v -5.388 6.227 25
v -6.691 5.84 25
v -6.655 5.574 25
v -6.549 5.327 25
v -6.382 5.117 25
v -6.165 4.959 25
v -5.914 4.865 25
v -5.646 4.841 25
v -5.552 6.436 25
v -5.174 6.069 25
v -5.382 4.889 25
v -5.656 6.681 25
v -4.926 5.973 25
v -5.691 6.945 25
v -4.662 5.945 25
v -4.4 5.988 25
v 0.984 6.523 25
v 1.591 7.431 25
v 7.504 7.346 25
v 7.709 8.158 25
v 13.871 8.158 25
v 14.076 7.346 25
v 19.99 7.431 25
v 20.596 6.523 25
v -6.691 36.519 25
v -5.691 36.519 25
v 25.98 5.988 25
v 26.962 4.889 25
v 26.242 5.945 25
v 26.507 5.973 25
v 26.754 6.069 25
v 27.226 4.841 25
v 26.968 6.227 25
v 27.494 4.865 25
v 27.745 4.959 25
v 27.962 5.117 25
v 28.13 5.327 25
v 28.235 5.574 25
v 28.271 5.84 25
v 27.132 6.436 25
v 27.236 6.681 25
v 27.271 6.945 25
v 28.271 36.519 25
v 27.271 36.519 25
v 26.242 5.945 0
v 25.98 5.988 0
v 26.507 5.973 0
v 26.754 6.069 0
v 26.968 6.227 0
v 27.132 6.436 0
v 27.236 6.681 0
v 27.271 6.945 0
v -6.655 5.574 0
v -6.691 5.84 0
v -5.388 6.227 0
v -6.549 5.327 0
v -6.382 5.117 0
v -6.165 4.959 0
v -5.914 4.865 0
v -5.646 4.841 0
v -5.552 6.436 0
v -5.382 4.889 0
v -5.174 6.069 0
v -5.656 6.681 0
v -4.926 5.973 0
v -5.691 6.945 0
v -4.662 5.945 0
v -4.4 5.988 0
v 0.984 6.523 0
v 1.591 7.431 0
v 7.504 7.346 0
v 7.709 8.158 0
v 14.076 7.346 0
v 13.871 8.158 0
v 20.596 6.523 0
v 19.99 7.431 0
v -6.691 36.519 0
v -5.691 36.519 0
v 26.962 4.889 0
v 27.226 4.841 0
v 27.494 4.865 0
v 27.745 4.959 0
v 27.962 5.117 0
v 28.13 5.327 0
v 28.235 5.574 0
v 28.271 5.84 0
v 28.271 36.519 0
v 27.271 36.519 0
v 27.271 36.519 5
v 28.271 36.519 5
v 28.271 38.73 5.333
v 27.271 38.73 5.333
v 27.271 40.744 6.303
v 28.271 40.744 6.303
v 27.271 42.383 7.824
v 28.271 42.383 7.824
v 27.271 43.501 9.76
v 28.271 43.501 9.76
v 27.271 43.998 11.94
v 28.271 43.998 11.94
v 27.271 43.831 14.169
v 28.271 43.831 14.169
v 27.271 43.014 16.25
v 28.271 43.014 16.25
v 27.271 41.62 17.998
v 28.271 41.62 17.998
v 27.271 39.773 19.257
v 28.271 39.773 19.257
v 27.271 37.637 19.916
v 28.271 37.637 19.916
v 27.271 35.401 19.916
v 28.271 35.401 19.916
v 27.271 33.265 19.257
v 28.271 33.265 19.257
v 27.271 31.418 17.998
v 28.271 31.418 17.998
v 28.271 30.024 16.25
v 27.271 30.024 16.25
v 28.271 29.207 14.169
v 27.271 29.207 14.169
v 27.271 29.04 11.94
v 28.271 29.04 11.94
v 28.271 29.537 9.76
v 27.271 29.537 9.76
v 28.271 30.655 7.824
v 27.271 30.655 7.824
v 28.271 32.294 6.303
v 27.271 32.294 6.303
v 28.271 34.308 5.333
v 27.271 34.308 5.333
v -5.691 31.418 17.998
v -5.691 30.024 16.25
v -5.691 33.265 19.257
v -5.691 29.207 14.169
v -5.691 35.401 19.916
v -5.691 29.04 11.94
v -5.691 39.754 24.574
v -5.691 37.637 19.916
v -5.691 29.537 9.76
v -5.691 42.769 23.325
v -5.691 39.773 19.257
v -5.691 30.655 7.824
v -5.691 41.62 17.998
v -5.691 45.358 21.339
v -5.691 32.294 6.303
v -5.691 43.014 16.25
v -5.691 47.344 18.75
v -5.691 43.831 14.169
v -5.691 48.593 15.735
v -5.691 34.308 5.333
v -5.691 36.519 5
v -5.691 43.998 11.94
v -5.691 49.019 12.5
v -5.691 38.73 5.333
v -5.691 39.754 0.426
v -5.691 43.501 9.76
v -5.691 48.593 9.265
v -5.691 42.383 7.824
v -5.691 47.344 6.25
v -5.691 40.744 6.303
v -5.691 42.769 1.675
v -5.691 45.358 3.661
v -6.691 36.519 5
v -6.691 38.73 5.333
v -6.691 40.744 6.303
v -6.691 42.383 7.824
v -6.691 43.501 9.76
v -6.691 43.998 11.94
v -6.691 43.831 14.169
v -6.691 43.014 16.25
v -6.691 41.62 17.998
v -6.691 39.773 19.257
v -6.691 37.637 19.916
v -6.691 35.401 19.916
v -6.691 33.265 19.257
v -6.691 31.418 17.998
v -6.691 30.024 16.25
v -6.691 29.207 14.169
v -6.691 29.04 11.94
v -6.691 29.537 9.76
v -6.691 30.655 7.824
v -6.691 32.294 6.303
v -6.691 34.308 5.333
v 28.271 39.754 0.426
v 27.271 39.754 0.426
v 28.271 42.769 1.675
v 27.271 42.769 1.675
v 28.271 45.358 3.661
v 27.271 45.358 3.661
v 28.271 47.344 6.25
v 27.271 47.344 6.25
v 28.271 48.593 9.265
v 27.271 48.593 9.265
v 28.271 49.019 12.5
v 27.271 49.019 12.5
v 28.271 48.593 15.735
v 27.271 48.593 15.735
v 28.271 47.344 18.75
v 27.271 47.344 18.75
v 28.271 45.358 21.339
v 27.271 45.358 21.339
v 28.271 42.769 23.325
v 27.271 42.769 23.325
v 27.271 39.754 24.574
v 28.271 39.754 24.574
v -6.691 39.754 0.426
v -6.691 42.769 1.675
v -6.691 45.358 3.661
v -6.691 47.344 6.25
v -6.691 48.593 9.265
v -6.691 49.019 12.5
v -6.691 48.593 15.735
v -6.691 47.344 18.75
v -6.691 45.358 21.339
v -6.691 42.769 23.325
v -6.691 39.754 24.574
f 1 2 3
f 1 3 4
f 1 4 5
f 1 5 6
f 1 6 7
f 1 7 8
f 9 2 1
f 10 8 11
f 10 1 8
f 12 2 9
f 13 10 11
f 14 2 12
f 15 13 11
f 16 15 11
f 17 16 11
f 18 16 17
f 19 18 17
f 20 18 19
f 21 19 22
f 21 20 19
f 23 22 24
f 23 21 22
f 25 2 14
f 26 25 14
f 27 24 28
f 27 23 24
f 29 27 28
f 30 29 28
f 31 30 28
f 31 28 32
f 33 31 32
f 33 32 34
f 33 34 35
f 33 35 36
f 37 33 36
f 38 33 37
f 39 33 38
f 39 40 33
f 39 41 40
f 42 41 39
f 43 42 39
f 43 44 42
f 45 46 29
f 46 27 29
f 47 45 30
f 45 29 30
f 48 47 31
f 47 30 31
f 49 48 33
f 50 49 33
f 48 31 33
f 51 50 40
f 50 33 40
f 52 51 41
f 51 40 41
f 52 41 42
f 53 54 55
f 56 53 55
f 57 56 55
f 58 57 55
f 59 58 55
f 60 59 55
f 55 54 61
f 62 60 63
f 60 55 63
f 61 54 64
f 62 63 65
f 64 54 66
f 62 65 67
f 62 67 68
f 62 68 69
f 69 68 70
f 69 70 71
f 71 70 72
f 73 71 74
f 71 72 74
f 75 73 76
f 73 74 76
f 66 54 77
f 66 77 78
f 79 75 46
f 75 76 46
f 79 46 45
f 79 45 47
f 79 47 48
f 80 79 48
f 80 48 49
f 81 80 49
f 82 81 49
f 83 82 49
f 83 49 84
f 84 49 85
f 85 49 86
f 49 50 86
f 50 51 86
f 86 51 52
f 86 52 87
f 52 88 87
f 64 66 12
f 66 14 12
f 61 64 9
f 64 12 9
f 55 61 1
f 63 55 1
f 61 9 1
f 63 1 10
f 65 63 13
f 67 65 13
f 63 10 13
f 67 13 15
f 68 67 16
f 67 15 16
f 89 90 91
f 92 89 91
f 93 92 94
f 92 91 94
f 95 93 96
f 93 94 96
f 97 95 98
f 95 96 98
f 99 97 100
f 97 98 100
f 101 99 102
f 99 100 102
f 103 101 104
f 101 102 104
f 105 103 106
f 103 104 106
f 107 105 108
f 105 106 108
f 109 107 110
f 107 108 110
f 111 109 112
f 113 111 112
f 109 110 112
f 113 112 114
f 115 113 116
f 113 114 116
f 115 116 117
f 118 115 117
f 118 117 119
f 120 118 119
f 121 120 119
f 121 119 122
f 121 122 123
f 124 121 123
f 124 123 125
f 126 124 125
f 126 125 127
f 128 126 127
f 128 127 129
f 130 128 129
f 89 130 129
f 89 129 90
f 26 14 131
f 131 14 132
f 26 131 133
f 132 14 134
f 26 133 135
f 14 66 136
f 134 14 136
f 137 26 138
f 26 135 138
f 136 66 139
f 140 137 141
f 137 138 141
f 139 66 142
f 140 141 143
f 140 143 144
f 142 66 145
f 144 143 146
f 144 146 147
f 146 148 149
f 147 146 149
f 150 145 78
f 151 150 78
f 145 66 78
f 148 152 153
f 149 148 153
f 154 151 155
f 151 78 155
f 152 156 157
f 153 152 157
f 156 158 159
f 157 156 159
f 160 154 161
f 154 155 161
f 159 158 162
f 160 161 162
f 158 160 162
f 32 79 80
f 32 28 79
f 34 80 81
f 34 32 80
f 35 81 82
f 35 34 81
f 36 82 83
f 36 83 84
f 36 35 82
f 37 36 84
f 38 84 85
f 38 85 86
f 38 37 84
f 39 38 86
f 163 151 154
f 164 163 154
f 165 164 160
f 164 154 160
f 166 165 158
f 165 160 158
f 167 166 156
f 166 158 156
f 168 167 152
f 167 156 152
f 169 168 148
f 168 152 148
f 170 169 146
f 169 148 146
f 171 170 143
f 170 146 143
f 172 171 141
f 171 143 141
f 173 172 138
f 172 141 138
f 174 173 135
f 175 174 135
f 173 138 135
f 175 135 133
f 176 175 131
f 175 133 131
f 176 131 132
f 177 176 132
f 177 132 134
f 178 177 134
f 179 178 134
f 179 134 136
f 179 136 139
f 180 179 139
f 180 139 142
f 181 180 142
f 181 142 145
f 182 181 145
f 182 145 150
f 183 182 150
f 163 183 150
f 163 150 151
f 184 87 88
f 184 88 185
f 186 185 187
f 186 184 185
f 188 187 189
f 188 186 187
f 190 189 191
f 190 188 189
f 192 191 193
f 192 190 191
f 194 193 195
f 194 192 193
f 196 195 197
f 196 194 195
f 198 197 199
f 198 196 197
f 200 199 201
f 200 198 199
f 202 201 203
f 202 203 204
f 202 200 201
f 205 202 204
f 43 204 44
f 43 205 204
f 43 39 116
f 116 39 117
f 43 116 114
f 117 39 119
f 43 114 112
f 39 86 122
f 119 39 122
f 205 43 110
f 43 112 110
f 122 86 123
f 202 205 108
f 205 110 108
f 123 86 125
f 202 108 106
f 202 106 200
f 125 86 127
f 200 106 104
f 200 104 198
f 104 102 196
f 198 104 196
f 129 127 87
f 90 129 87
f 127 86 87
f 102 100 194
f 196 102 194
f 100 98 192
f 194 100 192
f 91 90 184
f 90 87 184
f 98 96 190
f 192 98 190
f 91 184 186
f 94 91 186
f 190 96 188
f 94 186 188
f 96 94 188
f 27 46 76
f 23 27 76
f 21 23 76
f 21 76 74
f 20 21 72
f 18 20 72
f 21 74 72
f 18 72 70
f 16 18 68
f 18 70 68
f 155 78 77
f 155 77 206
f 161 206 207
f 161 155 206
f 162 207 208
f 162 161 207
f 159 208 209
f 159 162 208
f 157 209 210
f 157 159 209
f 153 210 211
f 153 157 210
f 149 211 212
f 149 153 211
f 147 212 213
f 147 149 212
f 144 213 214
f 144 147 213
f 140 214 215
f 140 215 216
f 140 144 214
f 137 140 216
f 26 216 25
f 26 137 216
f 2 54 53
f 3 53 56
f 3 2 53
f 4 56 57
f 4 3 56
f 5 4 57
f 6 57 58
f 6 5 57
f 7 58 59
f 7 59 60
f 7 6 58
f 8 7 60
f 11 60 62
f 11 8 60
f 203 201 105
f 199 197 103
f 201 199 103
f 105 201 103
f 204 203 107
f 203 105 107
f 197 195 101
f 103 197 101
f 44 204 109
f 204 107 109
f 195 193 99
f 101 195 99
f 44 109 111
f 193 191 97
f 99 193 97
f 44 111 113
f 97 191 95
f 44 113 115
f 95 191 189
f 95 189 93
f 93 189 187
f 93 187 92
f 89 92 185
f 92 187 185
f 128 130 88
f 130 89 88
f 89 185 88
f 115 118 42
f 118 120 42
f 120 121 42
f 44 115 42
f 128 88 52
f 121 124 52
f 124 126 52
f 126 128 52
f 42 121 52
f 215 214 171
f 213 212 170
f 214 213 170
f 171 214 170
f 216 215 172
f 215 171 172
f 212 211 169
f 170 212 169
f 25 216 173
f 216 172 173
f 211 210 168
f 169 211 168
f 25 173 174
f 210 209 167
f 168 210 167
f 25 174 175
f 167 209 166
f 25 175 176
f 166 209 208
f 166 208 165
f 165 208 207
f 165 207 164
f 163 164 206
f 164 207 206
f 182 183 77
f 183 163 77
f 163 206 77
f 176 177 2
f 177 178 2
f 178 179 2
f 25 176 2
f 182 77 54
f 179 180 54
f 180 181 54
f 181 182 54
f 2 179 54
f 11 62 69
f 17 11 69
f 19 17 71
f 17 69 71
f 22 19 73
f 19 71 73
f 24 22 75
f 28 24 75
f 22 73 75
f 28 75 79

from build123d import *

# Parameters (mm, degrees)
BOSS_EXTRUDE1_DEPTH = 25
FILLET1_R           = 1
FILLET2_R           = 1
FILLET3_R           = 0.05
CUT_EXTRUDE1_DEPTH  = 66.934416438
SKETCH5_R           = 7.5
CUT_EXTRUDE2_DEPTH  = 66.193638666


with BuildPart() as part:
    # Sketch2 → Boss-Extrude1 (new body)
    with BuildSketch(Plane.XY):
        with BuildLine():
            Line((-5.6909785, 5.576436412), (-5.6909785, 50))
            Line((-5.6909785, 50), (-6.6909785, 50))
            Line((-6.6909785, 50), (-6.6909785, 4.44447901))
            ThreePointArc((-6.6909785, 4.44447901), (10.790063167, 7.449269771), (28.271104834, 4.44447901))
            Line((28.271104834, 4.44447901), (28.271104834, 49.569009084))
            Line((28.271104834, 49.569009084), (27.271104834, 49.569009084))
            Line((27.271104834, 49.569009084), (27.271104834, 5.576436412))
            ThreePointArc((27.271104834, 5.576436412), (10.790063167, 8.24907617), (-5.6909785, 5.576436412))
        make_face()
    extrude(amount=BOSS_EXTRUDE1_DEPTH)

    # Fillet1
    fillet1_edges = [part.edges().sort_by_distance(p)[0] for p in [
        (-6.6909785, 4.44447901, 12.5),
        (28.271104834, 4.44447901, 12.5),
    ]]
    fillet(fillet1_edges, radius=FILLET1_R)

    # Fillet2
    fillet2_edges = [part.edges().sort_by_distance(p)[0] for p in [
        (-5.6909785, 5.576436412, 12.5),
        (27.271104834, 5.576436412, 12.5),
    ]]
    fillet(fillet2_edges, radius=FILLET2_R)

    # Fillet3
    fillet3_edges = [part.edges().sort_by_distance(p)[0] for p in [
        (-5.6909785, 50, 12.5),
        (-6.6909785, 50, 12.5),
        (28.271104834, 49.569009084, 12.5),
        (27.271104834, 49.569009084, 12.5),
    ]]
    fillet(fillet3_edges, radius=FILLET3_R)

    # Sketch4 → Cut-Extrude1 (cut, through all)
    with BuildSketch(Plane(origin=(28.271104834, 0, 0), x_dir=(0, 0, -1), z_dir=(1, 0, 0))):
        with BuildLine():
            Line((-25, 36.519009084), (-25, 49.519009084))
            Line((-25, 49.519009084), (0, 49.519009084))
            Line((0, 49.519009084), (0, 36.519009084))
            ThreePointArc((0, 36.519009084), (-12.5, 49.019009084), (-25, 36.519009084))
        make_face()
    extrude(amount=-CUT_EXTRUDE1_DEPTH, mode=Mode.SUBTRACT)


with BuildPart() as body_2:
    # of the pieces the cut leaves, the one that is kept (cut_extrude1_keep)
    add(part.part.solids().sort_by_distance((-5.6909785, 6.944623545, 0))[0])

    # Sketch5 → Cut-Extrude2 (cut, through all)
    with BuildSketch(Plane(origin=(28.271104834, 0, 0), x_dir=(0, 0, -1), z_dir=(1, 0, 0))):
        with Locations((-12.5, 36.519009084)):
            Circle(SKETCH5_R)
    extrude(amount=-CUT_EXTRUDE2_DEPTH, mode=Mode.SUBTRACT)


solid = body_2.part
